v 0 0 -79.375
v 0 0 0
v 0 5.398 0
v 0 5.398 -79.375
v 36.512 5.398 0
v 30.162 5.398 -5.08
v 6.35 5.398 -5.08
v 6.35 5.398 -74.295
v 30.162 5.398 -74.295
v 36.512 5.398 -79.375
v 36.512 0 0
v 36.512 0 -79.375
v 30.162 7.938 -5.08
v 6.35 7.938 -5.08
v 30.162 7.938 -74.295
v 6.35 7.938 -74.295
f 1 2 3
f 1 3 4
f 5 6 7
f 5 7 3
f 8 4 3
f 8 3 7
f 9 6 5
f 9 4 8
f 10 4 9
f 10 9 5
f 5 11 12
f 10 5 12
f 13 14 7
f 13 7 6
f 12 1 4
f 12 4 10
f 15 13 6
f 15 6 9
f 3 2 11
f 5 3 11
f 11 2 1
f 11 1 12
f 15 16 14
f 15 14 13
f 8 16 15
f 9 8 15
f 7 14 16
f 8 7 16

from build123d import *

# Parameters (mm, degrees)
SKETCH1_W           = 36.5125
SKETCH1_H           = 79.375
BOSS_EXTRUDE1_DEPTH = 7.9375
SKETCH2_W           = 36.5125
SKETCH2_H           = 79.375
SKETCH2_W_2         = 23.8125
SKETCH2_H_2         = 69.215
CUT_EXTRUDE1_DEPTH  = 2.54


with BuildPart() as part:
    # Sketch1 → Boss-Extrude1 (new body)
    with BuildSketch(Plane(origin=(0, 0, 0), x_dir=(1, 0, 0), z_dir=(0, 1, 0))):
        with Locations((18.25625, 39.6875)):
            Rectangle(SKETCH1_W, SKETCH1_H)
    extrude(amount=BOSS_EXTRUDE1_DEPTH)

    # Sketch2 → Cut-Extrude1 (cut)
    with BuildSketch(Plane(origin=(0, 7.9375, 0), x_dir=(1, 0, 0), z_dir=(0, 1, 0))):
        with Locations((18.25625, 39.6875)):
            Rectangle(SKETCH2_W, SKETCH2_H)
        with Locations((18.25625, 39.6875)):
            Rectangle(SKETCH2_W_2, SKETCH2_H_2, mode=Mode.SUBTRACT)
    extrude(amount=-CUT_EXTRUDE1_DEPTH, mode=Mode.SUBTRACT)


solid = part.part
